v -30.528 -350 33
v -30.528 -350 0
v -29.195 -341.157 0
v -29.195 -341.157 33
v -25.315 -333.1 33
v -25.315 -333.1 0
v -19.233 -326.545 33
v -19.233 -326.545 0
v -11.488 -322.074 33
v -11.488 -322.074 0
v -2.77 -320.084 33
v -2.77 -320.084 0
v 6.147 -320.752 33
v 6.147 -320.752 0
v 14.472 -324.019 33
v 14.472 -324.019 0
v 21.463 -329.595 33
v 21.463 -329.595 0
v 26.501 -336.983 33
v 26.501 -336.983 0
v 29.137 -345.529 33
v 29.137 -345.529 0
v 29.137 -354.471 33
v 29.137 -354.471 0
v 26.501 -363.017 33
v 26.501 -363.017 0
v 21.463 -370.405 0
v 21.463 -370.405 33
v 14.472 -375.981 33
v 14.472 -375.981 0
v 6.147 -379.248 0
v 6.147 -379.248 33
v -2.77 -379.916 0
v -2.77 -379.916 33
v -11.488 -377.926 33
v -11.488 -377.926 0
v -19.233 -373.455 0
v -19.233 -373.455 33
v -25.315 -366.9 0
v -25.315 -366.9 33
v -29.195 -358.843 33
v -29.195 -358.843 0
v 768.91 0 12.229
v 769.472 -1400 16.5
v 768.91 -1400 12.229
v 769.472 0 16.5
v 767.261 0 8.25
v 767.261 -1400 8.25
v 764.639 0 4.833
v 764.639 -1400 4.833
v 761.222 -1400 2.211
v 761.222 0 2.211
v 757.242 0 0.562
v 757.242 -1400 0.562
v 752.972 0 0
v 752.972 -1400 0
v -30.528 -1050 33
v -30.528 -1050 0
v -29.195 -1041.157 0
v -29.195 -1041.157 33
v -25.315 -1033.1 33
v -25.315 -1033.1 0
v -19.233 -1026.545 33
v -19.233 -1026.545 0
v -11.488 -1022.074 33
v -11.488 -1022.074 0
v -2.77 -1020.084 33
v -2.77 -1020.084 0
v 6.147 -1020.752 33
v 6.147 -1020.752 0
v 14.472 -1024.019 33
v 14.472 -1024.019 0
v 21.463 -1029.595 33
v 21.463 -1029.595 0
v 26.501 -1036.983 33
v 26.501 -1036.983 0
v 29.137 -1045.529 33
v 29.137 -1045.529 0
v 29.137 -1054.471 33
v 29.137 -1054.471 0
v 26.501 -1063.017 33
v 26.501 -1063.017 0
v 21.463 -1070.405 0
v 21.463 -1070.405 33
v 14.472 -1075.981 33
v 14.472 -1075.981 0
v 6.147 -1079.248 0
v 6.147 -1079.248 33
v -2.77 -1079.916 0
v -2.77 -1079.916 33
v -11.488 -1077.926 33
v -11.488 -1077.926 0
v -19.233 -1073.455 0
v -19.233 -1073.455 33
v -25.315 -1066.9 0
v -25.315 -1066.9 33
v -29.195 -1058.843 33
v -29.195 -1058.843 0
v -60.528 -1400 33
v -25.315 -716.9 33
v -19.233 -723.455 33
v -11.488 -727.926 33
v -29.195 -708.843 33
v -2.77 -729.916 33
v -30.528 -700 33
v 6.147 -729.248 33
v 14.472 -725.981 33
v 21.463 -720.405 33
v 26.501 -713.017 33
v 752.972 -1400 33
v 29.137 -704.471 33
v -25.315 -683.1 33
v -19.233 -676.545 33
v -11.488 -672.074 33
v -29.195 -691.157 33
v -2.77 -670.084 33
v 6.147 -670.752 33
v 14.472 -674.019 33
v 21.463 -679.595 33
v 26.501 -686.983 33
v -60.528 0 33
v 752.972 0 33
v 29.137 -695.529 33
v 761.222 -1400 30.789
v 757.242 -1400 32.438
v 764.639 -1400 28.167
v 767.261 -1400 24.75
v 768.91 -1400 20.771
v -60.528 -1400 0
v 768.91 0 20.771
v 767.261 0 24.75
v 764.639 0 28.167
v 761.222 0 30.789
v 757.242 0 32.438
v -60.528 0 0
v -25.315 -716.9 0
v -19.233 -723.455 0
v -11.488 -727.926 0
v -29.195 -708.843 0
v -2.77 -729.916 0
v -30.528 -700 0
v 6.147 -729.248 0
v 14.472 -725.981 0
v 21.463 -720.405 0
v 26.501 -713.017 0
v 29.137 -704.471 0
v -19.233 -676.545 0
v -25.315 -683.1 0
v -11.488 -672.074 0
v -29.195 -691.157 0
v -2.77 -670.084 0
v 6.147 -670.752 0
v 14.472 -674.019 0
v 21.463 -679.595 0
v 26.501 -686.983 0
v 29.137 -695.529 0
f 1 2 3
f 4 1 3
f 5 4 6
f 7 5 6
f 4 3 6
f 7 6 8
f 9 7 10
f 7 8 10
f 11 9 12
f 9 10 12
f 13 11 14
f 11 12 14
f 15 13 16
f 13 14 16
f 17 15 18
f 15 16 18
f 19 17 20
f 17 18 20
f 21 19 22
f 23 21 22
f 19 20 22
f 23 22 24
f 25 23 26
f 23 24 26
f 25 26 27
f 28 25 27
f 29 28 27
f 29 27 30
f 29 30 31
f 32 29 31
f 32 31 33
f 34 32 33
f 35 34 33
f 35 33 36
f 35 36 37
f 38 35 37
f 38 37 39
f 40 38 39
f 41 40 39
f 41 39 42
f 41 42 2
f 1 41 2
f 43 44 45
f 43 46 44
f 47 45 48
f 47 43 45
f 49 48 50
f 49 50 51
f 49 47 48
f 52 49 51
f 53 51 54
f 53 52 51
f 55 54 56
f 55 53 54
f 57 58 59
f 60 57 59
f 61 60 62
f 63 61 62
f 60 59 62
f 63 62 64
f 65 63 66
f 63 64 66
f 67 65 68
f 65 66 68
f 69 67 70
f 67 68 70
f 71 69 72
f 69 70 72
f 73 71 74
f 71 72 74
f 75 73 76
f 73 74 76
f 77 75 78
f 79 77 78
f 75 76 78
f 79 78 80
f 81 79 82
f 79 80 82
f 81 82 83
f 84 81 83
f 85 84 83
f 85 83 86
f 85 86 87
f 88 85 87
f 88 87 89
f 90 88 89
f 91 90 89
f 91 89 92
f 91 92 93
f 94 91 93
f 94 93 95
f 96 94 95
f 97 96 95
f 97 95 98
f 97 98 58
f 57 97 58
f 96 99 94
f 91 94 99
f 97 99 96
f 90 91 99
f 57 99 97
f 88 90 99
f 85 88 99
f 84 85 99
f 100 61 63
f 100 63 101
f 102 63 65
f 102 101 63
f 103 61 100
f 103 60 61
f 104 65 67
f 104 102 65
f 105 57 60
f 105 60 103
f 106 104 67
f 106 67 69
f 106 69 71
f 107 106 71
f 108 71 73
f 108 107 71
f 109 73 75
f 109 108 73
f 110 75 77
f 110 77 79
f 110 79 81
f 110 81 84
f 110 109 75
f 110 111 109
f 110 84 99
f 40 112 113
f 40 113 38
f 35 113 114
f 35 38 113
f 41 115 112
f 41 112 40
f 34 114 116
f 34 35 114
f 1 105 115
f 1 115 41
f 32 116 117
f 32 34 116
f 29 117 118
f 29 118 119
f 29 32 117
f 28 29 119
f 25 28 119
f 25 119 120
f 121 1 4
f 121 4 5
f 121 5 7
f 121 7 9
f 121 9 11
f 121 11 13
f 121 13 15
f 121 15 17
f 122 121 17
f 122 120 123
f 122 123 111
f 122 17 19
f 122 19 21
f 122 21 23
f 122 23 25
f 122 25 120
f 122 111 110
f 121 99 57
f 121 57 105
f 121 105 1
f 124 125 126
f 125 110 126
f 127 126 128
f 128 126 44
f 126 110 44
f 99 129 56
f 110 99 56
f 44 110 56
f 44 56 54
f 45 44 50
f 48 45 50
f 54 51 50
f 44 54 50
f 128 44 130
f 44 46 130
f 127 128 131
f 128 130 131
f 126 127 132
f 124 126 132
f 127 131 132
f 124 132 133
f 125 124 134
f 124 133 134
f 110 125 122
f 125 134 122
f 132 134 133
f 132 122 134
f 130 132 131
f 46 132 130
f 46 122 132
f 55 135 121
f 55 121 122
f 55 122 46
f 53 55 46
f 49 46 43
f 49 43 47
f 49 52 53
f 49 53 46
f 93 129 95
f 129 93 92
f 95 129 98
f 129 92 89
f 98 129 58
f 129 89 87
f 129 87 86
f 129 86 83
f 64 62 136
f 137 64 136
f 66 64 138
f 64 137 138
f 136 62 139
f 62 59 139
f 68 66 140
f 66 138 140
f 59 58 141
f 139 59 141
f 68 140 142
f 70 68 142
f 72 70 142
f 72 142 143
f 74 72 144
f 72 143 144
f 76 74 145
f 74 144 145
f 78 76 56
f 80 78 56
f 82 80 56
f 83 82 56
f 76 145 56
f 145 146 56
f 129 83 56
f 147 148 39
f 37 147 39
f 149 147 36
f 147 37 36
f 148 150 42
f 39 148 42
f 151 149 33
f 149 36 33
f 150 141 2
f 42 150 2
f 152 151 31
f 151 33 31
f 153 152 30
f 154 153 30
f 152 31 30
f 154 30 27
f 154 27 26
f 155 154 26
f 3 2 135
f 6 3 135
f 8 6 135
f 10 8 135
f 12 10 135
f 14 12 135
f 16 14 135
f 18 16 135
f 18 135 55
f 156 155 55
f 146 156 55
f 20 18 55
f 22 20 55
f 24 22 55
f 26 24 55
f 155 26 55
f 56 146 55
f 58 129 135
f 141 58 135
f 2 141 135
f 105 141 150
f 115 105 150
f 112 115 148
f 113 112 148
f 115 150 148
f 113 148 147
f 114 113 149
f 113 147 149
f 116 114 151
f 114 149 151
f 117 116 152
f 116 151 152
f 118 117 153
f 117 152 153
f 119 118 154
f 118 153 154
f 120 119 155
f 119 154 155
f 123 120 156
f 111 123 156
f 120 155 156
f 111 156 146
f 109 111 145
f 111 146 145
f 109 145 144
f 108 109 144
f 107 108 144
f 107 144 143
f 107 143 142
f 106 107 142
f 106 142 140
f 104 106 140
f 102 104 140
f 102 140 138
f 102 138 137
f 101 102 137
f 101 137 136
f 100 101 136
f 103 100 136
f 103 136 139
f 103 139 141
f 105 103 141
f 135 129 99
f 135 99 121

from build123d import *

# Parameters (mm, degrees)
F0_W     = 830
F0_H     = 1400
F1_DEPTH = 33
F2_R     = 16.49999
F4_D     = 60


# Not quite as in the source:
# - a fillet or chamfer is up to 0.001 mm smaller than in the source, because OpenCascade refuses the exact size


with BuildPart() as f1:
    # F0 (on Top) → F1 (new body)
    with BuildSketch(Plane.XY):
        with Locations((354.4717663527, -700)):
            Rectangle(F0_W, F0_H)
    extrude(amount=F1_DEPTH)

    # F2 (radius 16.5 in the source; OpenCascade refuses exactly that, so slightly less here)
    f2_edges = [f1.edges().sort_by_distance(p)[0] for p in [
        (769.471766, -700, 33),
        (769.471766, -700, 0),
    ]]
    fillet(f2_edges, radius=F2_R)

    # F4 (through all)
    with Locations(Plane.XY.offset(33)):
        with Locations((-0.5282336473, -1050), (-0.5282336473, -700), (-0.5282336473, -350)):
            Hole(F4_D / 2)


solid = f1.part
